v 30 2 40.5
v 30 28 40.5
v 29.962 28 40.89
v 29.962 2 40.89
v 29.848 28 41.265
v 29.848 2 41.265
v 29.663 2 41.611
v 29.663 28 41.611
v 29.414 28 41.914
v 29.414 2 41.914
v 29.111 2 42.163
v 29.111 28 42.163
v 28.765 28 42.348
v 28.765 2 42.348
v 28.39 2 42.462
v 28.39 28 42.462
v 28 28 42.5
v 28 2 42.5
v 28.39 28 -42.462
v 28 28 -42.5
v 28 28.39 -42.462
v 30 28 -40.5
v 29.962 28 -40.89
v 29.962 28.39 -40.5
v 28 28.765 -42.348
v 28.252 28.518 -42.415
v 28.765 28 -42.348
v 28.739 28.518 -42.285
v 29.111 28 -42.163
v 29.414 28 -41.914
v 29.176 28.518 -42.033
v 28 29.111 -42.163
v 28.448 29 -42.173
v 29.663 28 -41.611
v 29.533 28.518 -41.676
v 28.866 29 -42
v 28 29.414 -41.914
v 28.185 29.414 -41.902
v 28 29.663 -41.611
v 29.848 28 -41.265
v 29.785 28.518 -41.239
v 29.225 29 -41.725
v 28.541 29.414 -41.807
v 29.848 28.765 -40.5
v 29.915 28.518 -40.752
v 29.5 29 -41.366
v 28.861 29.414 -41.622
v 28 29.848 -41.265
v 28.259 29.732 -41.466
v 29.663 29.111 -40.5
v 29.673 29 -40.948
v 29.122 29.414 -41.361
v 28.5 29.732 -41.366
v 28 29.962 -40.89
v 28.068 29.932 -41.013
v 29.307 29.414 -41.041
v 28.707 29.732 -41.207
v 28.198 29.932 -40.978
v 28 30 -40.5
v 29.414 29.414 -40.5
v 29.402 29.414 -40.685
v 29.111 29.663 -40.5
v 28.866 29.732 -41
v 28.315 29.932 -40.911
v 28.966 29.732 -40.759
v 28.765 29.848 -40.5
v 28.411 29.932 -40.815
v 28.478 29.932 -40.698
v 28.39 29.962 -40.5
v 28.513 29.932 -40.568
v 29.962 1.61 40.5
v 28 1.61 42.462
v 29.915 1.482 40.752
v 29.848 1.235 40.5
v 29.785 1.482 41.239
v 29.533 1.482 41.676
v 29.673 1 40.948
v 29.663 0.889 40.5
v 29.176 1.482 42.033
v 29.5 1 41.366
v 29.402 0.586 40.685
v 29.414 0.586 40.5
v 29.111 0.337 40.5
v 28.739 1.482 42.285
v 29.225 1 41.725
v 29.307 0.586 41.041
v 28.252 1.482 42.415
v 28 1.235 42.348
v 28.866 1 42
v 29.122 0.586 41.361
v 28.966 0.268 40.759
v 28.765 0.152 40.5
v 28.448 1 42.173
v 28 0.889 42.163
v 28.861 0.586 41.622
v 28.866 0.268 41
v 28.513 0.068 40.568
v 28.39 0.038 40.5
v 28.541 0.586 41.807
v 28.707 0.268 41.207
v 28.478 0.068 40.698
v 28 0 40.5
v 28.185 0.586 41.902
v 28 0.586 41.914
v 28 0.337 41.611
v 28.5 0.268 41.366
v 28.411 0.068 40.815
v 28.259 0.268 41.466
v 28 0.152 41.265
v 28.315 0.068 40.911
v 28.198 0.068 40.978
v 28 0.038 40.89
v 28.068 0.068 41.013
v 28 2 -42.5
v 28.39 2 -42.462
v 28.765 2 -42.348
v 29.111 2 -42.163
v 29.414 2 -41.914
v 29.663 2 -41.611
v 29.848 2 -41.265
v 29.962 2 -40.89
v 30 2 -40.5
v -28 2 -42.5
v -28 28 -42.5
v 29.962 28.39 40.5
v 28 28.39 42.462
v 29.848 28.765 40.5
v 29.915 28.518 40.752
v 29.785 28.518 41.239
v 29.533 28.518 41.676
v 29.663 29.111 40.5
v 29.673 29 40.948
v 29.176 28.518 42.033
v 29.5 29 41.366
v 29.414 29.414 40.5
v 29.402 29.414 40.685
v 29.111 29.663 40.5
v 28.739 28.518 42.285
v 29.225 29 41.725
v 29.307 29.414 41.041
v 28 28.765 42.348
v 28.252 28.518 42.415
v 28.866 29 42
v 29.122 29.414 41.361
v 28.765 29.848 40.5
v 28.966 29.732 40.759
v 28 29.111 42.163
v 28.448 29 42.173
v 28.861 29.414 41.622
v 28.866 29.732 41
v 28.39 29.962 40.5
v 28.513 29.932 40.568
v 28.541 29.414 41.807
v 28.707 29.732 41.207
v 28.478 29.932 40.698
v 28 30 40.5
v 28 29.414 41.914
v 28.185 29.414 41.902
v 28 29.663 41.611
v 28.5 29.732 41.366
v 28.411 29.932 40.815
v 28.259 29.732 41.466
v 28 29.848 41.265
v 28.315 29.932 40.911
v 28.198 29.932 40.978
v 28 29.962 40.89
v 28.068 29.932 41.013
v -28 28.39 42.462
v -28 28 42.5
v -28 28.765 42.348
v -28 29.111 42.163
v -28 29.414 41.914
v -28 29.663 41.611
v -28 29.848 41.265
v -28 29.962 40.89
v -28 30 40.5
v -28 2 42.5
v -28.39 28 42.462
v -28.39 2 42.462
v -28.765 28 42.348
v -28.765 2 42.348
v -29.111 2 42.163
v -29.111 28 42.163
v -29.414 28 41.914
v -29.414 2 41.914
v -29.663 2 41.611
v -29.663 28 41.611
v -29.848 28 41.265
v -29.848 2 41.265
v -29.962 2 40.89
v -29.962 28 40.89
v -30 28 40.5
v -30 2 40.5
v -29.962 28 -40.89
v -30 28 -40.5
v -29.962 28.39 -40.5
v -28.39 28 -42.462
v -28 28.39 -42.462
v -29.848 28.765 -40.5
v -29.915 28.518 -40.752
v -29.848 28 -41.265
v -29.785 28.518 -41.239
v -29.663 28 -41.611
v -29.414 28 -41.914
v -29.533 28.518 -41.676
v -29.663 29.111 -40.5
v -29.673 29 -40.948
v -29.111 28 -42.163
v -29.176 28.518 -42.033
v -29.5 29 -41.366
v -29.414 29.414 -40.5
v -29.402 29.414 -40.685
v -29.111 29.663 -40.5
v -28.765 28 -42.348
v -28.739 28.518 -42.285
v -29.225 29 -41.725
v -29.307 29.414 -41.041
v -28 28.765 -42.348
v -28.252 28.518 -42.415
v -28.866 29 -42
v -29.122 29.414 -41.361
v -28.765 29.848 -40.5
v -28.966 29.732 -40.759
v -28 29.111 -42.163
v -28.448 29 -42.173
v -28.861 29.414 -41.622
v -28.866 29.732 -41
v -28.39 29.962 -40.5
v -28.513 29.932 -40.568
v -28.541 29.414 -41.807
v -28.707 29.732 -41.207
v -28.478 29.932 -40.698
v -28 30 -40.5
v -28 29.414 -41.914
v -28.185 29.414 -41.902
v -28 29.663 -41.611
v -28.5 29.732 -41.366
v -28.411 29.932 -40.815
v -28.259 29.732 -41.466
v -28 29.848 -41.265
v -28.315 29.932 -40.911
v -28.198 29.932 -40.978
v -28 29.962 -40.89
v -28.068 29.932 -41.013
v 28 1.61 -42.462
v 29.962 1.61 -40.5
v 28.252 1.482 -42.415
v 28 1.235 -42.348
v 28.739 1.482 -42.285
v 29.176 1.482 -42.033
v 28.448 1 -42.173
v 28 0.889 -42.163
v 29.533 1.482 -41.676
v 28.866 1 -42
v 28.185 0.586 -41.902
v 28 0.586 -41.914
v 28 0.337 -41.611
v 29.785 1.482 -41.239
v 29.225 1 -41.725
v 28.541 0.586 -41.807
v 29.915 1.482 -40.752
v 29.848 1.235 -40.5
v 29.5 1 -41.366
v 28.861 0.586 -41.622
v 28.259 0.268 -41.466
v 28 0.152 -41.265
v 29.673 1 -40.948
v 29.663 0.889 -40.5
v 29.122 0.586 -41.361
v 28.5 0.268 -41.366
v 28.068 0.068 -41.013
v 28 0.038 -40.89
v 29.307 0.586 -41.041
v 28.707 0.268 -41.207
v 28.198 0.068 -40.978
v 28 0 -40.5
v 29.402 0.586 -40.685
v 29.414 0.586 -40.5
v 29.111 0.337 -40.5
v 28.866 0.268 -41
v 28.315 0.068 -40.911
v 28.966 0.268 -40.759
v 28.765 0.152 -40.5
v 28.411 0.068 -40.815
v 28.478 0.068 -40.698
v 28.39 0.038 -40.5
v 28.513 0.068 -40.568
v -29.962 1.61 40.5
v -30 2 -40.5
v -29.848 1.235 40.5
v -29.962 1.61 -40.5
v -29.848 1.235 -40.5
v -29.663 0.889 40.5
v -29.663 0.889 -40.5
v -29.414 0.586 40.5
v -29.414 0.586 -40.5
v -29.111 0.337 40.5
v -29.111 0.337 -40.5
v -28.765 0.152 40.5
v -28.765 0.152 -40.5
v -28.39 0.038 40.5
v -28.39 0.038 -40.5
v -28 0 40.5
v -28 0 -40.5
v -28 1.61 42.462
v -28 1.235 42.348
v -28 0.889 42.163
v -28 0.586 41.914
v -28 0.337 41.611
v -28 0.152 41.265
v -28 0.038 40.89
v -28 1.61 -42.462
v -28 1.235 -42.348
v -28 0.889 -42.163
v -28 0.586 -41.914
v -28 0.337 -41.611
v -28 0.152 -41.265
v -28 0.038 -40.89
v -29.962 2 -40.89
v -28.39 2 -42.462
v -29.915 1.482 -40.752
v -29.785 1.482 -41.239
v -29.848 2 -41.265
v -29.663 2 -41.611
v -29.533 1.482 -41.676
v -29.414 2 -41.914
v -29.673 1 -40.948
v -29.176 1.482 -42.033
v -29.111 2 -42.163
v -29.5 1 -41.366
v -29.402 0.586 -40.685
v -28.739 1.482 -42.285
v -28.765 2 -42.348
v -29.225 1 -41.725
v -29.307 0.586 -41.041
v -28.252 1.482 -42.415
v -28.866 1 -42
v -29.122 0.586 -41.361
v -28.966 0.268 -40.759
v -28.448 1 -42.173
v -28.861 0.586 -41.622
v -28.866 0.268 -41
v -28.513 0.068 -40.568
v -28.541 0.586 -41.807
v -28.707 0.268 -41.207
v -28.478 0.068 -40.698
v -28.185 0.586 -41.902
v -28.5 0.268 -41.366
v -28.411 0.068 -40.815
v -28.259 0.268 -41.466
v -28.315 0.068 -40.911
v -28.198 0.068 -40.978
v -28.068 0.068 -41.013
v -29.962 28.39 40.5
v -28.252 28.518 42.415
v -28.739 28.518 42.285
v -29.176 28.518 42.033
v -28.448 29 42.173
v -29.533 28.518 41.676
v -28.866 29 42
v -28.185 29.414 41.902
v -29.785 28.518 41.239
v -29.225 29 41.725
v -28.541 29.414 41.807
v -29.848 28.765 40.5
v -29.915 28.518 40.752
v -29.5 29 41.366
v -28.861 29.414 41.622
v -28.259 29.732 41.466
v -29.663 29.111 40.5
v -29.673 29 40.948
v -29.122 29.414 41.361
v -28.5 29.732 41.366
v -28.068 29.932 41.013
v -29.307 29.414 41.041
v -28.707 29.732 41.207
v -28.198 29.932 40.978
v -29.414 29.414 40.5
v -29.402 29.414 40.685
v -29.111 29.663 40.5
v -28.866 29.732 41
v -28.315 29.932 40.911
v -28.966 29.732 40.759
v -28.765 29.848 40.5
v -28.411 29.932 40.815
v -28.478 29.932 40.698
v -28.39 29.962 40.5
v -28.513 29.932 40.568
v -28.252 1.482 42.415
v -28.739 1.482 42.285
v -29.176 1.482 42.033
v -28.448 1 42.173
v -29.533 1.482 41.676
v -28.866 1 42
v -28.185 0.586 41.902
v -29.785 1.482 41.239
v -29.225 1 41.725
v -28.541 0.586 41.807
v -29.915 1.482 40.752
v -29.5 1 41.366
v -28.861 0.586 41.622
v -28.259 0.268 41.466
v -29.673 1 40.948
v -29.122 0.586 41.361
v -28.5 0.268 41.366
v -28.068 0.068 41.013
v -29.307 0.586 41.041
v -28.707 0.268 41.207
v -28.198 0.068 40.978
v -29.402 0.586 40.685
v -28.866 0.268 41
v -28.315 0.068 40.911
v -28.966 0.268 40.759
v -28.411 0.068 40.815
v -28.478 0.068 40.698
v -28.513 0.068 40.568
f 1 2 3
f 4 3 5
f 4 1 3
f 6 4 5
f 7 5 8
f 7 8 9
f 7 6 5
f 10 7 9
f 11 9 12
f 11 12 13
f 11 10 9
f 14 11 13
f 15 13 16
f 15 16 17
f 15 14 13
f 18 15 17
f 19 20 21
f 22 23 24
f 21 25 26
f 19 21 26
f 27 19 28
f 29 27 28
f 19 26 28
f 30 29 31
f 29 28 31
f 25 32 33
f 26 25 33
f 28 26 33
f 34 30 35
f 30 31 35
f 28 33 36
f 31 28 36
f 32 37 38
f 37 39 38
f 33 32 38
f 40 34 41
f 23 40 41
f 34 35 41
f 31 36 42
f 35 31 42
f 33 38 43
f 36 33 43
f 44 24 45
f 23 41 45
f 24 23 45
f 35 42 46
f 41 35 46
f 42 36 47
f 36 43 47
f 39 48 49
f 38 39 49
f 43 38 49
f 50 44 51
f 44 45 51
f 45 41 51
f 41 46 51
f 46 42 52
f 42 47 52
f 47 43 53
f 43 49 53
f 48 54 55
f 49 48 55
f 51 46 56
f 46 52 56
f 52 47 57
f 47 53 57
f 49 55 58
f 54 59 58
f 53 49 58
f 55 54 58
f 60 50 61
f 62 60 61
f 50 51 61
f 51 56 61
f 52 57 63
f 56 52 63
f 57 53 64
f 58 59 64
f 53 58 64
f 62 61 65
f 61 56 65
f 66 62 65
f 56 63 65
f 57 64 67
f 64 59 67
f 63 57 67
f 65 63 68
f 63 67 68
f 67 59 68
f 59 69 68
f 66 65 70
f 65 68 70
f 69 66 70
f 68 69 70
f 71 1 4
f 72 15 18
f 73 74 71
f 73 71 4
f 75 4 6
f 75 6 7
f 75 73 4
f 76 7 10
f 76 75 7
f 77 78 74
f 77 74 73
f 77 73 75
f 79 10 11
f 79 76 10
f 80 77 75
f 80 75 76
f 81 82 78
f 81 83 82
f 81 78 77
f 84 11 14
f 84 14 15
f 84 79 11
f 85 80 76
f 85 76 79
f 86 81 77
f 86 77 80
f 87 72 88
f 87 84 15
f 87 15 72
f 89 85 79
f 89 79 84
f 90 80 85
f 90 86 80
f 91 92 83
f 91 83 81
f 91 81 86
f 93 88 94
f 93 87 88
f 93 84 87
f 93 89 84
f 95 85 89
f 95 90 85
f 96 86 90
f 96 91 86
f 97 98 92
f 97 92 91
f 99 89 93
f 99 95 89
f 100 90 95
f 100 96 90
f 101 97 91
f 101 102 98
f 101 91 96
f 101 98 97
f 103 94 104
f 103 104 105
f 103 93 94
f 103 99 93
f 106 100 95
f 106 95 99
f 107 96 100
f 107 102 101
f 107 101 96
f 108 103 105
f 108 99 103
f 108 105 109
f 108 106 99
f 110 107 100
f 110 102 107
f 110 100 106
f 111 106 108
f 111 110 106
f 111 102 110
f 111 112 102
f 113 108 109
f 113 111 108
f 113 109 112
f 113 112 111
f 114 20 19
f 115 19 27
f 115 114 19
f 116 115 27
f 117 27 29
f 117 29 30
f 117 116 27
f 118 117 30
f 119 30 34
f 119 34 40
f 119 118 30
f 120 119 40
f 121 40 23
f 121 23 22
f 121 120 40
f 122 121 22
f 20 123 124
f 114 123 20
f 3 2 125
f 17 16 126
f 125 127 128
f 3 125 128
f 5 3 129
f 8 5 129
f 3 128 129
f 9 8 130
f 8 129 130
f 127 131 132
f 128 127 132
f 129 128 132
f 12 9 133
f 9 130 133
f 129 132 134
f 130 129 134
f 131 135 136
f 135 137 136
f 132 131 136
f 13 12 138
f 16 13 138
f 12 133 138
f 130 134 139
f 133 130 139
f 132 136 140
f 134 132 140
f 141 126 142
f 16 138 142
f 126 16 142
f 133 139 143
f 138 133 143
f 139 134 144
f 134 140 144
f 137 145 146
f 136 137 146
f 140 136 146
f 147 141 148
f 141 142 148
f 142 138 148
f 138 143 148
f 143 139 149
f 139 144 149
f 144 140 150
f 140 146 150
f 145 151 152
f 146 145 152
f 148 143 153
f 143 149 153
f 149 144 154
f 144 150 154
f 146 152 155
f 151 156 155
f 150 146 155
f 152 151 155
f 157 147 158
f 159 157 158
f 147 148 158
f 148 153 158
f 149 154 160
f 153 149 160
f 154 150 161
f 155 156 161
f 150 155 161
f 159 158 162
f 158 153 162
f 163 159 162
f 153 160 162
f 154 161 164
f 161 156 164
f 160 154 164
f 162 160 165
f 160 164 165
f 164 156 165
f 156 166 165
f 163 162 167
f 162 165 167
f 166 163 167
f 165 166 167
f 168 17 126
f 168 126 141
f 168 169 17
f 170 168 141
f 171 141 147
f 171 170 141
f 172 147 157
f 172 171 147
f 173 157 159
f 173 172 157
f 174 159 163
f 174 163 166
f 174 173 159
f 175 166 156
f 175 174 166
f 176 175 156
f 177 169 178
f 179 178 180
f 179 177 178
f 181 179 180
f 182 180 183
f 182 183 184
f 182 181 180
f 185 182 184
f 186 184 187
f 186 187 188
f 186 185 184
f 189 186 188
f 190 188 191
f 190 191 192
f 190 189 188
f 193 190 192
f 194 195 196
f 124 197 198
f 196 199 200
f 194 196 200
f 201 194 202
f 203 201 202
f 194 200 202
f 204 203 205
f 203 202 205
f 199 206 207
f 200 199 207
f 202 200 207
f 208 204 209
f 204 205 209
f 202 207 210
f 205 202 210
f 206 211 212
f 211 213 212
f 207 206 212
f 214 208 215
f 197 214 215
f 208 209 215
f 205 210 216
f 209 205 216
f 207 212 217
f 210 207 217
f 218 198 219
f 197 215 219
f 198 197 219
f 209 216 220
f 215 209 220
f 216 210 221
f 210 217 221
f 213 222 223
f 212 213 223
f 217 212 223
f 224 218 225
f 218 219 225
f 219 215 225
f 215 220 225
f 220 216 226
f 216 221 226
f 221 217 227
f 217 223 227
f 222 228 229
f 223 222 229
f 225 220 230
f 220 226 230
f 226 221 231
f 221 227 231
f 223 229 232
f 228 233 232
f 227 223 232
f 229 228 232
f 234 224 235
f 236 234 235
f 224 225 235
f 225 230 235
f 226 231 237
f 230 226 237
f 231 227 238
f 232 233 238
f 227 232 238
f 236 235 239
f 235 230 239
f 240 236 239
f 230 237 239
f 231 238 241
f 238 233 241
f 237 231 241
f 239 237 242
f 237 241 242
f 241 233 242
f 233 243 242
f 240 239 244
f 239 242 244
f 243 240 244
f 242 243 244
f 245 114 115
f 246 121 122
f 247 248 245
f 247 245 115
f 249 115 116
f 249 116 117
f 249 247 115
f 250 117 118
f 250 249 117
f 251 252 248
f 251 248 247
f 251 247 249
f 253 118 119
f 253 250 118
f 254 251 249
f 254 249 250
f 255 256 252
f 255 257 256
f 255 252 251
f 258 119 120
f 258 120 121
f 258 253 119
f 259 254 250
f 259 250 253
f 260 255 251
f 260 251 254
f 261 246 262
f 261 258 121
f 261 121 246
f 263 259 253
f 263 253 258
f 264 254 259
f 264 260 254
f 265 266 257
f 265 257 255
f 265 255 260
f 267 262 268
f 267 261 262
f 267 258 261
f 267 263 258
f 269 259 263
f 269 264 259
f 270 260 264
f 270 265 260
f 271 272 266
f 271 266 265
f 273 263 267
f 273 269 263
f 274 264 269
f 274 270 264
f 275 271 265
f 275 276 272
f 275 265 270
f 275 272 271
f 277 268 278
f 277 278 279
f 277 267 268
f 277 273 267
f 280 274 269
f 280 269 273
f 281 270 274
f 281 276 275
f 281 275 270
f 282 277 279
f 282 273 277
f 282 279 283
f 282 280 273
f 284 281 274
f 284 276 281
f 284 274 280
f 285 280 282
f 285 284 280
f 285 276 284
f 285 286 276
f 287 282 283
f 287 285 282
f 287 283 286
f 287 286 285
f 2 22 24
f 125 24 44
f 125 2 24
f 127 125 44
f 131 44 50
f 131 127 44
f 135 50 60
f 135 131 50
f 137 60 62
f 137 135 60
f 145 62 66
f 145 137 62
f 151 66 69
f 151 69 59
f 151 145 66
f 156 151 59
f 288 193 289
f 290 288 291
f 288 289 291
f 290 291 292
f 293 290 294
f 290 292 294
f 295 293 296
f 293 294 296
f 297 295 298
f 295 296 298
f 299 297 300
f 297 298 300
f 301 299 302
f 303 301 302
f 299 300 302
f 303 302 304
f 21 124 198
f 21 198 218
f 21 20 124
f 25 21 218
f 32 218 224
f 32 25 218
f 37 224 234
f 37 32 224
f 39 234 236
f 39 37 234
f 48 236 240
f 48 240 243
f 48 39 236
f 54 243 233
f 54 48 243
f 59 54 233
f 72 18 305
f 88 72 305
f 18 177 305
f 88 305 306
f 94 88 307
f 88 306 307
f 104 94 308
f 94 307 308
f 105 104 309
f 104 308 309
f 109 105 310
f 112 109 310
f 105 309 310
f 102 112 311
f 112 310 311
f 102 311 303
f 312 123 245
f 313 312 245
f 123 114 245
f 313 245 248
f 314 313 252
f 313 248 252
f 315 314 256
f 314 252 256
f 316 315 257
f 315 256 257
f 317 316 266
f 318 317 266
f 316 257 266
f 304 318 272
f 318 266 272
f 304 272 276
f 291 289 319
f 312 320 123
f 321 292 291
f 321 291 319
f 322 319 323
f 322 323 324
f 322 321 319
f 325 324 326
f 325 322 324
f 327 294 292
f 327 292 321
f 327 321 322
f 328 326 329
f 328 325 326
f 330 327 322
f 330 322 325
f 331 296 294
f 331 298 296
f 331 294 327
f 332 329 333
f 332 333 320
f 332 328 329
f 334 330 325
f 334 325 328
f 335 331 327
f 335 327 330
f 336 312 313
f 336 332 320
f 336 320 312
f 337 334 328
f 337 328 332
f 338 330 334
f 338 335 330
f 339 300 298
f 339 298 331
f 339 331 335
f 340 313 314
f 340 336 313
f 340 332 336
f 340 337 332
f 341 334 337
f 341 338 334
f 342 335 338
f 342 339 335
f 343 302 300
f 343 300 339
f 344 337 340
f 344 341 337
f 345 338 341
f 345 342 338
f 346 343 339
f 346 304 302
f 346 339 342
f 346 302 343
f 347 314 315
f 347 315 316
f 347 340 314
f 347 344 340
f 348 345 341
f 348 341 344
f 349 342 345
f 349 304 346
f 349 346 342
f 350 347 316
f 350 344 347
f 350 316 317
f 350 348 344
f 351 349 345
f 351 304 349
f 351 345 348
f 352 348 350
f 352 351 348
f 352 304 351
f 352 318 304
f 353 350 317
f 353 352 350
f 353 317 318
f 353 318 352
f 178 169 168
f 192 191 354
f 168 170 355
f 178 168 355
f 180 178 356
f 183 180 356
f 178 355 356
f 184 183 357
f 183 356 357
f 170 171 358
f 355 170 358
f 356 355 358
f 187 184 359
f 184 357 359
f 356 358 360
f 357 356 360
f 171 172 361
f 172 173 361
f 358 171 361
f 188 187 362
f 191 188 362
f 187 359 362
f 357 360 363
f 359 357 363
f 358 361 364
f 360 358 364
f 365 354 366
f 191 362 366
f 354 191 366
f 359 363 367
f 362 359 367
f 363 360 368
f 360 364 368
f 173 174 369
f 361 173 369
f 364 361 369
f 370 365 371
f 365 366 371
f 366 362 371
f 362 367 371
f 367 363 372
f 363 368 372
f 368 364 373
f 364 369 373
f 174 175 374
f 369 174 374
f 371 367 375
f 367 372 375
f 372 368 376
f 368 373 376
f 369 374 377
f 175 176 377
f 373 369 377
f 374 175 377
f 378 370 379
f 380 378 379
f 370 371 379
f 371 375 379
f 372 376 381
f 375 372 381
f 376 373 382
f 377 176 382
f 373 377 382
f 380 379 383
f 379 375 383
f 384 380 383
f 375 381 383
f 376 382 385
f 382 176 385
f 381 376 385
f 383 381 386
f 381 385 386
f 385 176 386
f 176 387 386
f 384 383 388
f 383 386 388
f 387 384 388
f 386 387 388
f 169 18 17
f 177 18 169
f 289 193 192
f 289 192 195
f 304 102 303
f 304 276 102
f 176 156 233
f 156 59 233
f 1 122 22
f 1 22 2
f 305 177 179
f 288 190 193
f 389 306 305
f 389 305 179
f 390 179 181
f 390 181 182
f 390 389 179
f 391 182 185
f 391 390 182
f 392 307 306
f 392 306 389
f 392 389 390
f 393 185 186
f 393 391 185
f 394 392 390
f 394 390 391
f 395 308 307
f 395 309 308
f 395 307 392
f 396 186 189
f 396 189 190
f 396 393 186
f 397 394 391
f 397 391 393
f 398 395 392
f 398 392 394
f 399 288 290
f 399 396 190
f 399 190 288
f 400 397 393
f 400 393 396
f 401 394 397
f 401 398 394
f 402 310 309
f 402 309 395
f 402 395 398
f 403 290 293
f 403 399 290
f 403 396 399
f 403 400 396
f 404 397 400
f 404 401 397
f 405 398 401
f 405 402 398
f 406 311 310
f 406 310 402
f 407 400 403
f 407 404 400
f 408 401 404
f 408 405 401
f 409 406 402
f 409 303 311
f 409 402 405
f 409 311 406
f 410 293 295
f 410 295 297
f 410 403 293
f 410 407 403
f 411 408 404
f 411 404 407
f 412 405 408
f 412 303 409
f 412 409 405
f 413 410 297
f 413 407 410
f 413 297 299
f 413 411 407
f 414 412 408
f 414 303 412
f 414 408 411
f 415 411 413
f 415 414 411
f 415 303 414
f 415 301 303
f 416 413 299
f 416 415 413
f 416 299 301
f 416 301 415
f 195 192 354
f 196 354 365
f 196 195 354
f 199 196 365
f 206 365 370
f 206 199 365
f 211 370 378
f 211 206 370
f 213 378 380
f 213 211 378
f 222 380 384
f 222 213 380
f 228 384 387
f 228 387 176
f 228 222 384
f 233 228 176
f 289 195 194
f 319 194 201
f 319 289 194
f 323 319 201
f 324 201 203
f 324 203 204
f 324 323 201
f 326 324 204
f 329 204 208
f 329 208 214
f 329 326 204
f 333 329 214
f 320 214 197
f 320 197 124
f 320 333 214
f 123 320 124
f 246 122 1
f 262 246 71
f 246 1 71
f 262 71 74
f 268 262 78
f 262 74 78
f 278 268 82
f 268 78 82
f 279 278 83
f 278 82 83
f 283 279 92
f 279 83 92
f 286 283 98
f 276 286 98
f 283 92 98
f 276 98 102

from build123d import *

# Parameters (mm, degrees)
EXTRUDE_1_DEPTH = 30
FILLET_1_R      = 2


with BuildPart() as part:
    # 草图1 → 凸台-拉伸1 (new body)
    with BuildSketch(Plane(origin=(0, 0, 0), x_dir=(1, 0, 0), z_dir=(0, 1, 0))):
        with BuildLine():
            Line((-28, 42.5), (28, 42.5))
            ThreePointArc((28, 42.5), (29.414213562, 41.914213562), (30, 40.5))
            Line((30, 40.5), (30, -40.5))
            ThreePointArc((30, -40.5), (29.414213562, -41.914213562), (28, -42.5))
            Line((28, -42.5), (-28, -42.5))
            ThreePointArc((-28, -42.5), (-29.414213562, -41.914213562), (-30, -40.5))
            Line((-30, -40.5), (-30, 40.5))
            ThreePointArc((-30, 40.5), (-29.414213562, 41.914213562), (-28, 42.5))
        make_face()
    extrude(amount=EXTRUDE_1_DEPTH)

    # 圆角1
    fillet_1_edges = [part.edges().sort_by_distance(p)[0] for p in [
        (29.414213562, 30, 41.914213562),
        (0, 0, 42.5),
        (-29.414213562, 0, 41.914213562),
        (30, 30, 0),
        (29.414213562, 30, -41.914213562),
        (0, 30, -42.5),
        (-29.414213562, 30, -41.914213562),
        (-30, 30, 0),
        (-29.414213562, 30, 41.914213562),
        (0, 30, 42.5),
        (-30, 0, 0),
        (-29.414213562, 0, -41.914213562),
        (0, 0, -42.5),
        (29.414213562, 0, -41.914213562),
        (30, 0, 0),
        (29.414213562, 0, 41.914213562),
    ]]
    fillet(fillet_1_edges, radius=FILLET_1_R)


solid = part.part
